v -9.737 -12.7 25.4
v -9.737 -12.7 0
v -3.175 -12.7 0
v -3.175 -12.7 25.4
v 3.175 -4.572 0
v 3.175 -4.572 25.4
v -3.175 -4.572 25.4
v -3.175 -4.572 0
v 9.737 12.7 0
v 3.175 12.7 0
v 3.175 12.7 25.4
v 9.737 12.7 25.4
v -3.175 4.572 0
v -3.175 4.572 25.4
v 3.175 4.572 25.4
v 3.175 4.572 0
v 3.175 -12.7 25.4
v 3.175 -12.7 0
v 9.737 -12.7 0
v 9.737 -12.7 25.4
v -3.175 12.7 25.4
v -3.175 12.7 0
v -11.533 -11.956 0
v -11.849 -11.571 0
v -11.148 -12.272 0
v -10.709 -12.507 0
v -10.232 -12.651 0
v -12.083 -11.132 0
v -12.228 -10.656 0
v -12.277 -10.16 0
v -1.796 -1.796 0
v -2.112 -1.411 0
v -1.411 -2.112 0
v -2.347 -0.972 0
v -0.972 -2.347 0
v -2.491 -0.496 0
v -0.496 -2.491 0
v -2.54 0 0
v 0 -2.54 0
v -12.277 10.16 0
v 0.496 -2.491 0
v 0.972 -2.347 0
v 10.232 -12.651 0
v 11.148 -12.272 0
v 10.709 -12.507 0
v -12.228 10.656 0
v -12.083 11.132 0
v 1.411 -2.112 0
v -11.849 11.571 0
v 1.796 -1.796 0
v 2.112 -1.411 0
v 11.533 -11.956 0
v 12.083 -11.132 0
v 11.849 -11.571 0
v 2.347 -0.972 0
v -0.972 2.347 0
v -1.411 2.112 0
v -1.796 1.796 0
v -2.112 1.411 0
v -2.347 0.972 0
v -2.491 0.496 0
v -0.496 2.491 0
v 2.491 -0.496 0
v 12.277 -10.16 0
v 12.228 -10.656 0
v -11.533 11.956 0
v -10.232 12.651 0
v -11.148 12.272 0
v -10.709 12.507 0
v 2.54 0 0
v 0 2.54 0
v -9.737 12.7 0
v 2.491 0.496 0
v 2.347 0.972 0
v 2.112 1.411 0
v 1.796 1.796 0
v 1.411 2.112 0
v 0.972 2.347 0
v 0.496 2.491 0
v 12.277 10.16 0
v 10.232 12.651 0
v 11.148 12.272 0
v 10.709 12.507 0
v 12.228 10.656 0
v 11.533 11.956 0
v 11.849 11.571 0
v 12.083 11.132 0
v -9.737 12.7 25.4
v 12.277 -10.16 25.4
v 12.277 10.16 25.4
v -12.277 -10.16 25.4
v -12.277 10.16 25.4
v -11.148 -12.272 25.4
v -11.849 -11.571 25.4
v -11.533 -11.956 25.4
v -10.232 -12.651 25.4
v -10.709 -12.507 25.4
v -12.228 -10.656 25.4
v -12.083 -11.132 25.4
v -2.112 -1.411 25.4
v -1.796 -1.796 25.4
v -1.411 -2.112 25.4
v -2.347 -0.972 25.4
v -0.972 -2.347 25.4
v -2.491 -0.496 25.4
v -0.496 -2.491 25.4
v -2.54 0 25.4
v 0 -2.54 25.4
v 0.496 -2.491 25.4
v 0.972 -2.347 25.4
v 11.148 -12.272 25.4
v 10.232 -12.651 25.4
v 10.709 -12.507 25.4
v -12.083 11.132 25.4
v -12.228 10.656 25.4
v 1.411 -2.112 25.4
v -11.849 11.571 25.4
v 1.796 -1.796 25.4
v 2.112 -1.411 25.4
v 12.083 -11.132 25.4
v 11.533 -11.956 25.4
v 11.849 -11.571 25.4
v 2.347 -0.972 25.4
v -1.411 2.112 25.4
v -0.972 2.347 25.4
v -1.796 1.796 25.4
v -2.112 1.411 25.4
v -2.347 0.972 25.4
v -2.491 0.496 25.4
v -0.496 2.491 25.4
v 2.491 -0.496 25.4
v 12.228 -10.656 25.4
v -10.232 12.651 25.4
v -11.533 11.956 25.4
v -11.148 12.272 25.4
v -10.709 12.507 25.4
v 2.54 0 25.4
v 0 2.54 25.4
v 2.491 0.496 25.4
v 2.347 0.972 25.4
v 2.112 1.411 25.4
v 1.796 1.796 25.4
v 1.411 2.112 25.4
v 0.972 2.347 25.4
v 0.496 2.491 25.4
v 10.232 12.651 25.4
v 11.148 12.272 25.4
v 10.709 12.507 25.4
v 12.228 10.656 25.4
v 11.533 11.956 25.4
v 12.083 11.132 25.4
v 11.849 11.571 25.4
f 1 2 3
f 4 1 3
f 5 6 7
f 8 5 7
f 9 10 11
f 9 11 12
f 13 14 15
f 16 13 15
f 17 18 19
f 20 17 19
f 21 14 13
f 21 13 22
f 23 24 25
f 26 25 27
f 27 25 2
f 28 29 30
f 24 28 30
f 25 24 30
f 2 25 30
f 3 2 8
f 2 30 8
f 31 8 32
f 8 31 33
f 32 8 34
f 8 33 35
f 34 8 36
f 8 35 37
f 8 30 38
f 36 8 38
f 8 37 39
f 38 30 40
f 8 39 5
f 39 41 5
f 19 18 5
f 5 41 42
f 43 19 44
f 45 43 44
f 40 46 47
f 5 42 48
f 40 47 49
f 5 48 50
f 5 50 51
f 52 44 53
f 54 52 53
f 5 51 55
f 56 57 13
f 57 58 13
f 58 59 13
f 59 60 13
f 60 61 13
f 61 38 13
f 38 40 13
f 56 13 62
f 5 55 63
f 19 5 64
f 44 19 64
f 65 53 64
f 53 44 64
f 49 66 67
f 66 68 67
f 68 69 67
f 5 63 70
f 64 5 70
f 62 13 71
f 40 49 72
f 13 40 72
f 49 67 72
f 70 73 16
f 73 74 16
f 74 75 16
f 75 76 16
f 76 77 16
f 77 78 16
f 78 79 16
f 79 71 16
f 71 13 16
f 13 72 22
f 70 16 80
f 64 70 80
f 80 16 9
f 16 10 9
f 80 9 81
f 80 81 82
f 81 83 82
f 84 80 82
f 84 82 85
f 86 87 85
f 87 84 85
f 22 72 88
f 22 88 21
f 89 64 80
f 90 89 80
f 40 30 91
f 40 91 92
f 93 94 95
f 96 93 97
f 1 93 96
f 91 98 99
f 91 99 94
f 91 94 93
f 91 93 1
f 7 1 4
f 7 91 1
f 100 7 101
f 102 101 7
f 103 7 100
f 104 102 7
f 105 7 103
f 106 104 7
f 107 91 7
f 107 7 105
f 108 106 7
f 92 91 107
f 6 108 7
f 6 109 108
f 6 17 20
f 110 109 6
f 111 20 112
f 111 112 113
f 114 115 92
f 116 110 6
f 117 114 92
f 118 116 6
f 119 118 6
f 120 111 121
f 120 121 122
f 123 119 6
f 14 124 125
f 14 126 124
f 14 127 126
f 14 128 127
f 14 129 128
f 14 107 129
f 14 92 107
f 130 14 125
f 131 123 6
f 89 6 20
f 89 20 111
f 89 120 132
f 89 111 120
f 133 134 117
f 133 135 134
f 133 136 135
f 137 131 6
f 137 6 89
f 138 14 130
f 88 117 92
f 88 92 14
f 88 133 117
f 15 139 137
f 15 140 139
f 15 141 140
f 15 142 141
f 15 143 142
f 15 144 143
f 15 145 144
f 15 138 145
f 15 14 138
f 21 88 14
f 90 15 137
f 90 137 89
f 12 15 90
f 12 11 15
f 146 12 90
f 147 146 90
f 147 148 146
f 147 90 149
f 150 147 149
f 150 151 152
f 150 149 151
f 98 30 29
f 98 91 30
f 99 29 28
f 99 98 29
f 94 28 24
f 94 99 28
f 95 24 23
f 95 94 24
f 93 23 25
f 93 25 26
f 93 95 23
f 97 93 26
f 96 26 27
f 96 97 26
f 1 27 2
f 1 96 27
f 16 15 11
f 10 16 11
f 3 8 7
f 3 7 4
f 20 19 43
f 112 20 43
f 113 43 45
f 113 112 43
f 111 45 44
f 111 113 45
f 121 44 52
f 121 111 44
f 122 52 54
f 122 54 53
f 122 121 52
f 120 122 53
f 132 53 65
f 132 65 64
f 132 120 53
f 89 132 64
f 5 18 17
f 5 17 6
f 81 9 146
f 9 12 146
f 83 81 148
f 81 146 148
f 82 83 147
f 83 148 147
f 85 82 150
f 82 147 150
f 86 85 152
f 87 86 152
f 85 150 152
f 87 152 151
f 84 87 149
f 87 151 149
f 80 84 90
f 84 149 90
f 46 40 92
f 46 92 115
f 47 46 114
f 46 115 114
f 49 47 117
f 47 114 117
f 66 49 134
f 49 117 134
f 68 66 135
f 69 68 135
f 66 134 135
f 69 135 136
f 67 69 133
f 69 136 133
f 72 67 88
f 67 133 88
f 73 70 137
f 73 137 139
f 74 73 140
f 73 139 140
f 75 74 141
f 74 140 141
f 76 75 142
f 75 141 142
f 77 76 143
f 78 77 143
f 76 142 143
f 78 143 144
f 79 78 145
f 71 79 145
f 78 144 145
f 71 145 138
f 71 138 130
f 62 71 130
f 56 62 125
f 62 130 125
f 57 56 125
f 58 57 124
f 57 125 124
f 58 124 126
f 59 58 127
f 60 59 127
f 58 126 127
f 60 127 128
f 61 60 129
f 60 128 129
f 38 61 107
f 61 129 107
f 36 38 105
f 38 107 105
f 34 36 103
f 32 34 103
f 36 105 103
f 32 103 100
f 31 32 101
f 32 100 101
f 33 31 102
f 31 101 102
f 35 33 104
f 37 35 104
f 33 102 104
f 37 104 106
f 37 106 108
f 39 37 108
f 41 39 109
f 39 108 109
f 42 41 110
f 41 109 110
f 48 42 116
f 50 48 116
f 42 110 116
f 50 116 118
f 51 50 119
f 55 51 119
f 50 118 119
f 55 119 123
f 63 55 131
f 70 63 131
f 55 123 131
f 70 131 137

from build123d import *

# Parameters (mm, degrees)
F0_W     = 24.553348
F0_H     = 25.4
F1_DEPTH = 25.4
F2_R     = 2.54
F3_DEPTH = 25.4
F4_R     = 2.54
F5_W     = 6.35
F5_H     = 16.256
F6_DEPTH = 25.4
F7_W     = 6.35
F7_H     = 8.128
F9_DEPTH = 25.4


with BuildPart() as f1:
    # F0 (on Top) → F1 (new body)
    with BuildSketch(Plane.XY):
        Rectangle(F0_W, F0_H)
    extrude(amount=F1_DEPTH)

    # F2 (on face) → F3 (cut)
    with BuildSketch(Plane.XY.offset(25.4)):
        Circle(F2_R)
    extrude(amount=-F3_DEPTH, mode=Mode.SUBTRACT)

    # F4
    f4_edges = [f1.edges().sort_by_distance(p)[0] for p in [
        (-12.276674, -12.7, 12.7),
        (-12.276674, 12.7, 12.7),
        (12.276674, -12.7, 12.7),
        (12.276674, 12.7, 12.7),
    ]]
    fillet(f4_edges, radius=F4_R)

    # F5 (on face) → F6 (cut)
    with BuildSketch(Plane.XY.offset(25.4)):
        with Locations((0, 12.7)):
            Rectangle(F5_W, F5_H)
    extrude(amount=-F6_DEPTH, mode=Mode.SUBTRACT)

    # F7 (on face) → F9 (cut)
    with BuildSketch(Plane.XY.offset(25.4)):
        with Locations((0, 8.636)):
            Rectangle(F7_W, F7_H)
        Polygon((-3.175, -4.572), (-3.175001, -12.7), (3.174999, -12.7), (3.175, -4.572), align=None)
    extrude(amount=-F9_DEPTH, mode=Mode.SUBTRACT)


solid = f1.part
